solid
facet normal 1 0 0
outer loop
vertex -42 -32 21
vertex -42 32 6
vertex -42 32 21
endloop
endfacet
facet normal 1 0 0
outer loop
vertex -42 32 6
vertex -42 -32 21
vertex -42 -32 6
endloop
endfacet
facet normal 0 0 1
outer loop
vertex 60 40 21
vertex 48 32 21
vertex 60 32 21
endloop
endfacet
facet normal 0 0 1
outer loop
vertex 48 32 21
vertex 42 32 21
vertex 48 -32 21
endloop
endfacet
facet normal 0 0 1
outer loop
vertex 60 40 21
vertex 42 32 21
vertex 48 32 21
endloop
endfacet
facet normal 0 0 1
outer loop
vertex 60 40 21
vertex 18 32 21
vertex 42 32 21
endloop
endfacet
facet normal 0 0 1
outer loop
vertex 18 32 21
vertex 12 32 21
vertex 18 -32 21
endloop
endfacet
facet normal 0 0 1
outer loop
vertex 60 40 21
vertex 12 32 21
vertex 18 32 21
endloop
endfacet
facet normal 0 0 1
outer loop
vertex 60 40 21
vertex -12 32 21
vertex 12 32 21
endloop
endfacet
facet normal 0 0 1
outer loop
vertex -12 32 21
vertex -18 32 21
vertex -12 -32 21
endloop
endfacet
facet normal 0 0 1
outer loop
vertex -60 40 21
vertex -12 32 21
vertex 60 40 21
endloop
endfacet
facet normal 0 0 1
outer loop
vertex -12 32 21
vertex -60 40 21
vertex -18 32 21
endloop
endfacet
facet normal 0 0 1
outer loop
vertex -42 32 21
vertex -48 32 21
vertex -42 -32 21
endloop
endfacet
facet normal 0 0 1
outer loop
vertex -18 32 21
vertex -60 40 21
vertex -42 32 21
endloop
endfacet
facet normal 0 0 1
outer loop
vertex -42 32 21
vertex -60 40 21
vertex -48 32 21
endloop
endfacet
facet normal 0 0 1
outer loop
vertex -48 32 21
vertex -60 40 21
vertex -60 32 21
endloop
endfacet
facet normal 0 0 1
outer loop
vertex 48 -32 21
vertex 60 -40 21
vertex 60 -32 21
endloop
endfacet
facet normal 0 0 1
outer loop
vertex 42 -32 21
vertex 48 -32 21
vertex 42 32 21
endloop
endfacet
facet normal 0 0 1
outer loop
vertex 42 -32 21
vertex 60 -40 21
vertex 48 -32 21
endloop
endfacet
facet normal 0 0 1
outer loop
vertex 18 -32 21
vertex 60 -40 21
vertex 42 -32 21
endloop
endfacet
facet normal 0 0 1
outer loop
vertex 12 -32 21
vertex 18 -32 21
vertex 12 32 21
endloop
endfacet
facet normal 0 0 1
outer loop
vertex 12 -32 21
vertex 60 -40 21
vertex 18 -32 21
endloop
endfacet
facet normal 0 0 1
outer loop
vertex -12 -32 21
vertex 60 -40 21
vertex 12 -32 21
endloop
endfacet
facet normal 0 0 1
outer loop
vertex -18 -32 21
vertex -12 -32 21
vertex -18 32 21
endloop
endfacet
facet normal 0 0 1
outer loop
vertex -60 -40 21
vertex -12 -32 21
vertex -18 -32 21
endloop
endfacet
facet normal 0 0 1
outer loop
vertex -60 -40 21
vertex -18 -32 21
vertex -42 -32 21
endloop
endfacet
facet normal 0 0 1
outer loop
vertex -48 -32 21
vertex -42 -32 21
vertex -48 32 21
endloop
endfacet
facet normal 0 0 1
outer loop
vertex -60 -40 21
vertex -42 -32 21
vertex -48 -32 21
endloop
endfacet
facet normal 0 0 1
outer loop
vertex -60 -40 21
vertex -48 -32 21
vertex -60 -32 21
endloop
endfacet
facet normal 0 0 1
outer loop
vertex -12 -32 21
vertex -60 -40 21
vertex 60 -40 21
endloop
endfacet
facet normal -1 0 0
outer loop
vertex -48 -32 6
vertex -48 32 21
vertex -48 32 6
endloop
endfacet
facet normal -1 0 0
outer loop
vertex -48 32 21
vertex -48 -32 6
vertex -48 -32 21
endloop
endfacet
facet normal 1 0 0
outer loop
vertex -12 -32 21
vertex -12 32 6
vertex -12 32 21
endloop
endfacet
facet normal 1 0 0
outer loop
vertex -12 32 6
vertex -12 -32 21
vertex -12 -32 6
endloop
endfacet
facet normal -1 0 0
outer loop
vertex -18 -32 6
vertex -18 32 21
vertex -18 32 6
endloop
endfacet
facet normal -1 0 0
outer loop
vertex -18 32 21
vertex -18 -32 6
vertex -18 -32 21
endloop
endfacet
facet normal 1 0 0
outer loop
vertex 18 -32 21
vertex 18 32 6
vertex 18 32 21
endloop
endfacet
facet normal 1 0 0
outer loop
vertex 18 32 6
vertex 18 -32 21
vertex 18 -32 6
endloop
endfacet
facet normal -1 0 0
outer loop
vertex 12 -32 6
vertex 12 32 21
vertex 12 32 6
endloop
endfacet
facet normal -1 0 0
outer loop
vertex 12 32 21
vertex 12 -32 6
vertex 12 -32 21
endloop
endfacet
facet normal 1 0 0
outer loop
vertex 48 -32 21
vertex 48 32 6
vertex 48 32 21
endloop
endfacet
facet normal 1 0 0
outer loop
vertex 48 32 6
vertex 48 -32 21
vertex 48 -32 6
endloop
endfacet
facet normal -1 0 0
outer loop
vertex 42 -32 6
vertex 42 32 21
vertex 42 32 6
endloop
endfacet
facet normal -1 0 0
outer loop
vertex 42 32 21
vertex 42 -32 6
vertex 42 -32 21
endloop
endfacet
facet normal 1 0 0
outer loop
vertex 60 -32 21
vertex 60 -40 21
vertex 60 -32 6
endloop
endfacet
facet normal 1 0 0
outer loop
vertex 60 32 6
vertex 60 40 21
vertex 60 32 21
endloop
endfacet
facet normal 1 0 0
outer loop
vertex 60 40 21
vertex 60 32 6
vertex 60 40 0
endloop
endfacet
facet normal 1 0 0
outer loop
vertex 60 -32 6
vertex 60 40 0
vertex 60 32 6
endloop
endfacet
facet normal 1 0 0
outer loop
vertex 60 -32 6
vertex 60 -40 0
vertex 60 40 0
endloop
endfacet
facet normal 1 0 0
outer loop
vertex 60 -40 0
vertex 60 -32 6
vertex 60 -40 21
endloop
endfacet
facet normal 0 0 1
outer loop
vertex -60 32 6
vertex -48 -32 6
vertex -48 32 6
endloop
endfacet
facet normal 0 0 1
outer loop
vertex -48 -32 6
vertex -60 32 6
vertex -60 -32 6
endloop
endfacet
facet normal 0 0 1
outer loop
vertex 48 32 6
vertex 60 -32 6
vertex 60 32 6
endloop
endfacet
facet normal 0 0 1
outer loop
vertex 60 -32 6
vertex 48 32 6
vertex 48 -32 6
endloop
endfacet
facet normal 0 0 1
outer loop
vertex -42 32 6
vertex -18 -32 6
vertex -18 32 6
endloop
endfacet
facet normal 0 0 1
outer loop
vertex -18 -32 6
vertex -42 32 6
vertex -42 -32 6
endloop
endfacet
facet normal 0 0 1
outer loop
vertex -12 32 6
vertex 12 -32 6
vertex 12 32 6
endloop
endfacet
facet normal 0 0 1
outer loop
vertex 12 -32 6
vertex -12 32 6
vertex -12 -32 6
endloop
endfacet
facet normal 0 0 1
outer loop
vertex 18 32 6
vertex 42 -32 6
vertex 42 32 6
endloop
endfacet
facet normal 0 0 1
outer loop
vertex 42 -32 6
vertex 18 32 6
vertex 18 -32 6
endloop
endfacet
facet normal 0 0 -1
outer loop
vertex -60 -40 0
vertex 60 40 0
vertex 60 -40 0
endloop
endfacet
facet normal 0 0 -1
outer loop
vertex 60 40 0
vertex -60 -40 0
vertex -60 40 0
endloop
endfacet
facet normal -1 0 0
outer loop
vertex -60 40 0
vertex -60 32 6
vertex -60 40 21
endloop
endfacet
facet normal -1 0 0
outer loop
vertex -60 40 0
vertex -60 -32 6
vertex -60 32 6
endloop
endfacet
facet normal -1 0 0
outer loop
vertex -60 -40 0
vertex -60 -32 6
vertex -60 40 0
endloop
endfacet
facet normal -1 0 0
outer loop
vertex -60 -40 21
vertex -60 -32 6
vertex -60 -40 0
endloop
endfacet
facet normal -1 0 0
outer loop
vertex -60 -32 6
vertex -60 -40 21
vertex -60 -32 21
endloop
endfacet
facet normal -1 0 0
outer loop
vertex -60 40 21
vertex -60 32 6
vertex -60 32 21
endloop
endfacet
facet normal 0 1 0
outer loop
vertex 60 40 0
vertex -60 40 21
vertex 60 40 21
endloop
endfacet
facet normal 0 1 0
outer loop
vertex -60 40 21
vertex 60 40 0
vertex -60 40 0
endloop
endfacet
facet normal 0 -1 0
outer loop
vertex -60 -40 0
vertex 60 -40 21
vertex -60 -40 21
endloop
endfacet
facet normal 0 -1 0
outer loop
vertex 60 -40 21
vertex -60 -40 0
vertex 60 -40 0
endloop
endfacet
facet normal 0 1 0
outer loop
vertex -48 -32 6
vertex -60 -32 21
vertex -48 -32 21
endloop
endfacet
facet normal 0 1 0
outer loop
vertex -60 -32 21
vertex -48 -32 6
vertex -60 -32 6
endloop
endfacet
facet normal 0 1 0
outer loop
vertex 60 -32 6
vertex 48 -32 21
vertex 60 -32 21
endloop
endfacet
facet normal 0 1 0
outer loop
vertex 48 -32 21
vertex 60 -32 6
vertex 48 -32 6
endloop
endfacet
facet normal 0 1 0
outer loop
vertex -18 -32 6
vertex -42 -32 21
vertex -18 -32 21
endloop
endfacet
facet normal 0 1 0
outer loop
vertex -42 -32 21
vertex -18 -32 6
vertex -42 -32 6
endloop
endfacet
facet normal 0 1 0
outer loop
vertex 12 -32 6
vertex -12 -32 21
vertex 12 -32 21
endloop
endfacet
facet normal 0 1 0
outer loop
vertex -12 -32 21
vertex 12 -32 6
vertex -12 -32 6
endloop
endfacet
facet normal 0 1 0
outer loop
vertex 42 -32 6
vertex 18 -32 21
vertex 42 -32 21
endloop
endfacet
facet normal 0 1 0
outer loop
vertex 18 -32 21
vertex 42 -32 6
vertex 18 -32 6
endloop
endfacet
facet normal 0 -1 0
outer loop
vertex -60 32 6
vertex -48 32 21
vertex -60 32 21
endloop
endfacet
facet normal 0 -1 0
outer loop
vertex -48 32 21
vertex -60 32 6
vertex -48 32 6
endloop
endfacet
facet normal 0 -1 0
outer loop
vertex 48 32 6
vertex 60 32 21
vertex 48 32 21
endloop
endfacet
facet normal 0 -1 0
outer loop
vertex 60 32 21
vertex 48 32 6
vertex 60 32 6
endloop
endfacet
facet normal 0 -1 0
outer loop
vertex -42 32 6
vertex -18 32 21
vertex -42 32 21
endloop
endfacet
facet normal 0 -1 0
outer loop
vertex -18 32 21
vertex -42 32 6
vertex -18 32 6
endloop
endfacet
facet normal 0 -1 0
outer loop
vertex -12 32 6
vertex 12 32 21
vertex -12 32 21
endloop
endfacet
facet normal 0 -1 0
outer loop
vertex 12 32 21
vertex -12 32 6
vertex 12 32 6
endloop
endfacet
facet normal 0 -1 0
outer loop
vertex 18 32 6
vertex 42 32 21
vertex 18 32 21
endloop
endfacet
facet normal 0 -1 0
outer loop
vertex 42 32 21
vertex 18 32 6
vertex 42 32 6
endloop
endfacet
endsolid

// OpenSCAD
$fn = 32;

// ----------------------------------------------------------------------
// Rib frame 120 x 80 x 21
// 4 ribs at 30 mm pitch
// ----------------------------------------------------------------------

// --- parameters (mm) ---
frame = [120, 80, 6];  // base plate size (x, y, z)
rail_w = 8;            // side rail width
ribs = 4;              // number of ribs
rib_t = 6;             // rib thickness
rib_h = 15;            // rib height above the base plate
pitch = 30;            // pitch between rib centres

// --- derived feature positions (mm) ---
span = (ribs - 1) * pitch;          // = 90   distance between the outer ribs
origin_x = -span / 2;               // = -45   X of the first rib
rib_len = frame[1] - 2 * rail_w + 2;  // = 66   rib length, 1 mm into each rail
feature_centers = [
  [origin_x + 0 * pitch, 0],
  [origin_x + 1 * pitch, 0],
  [origin_x + 2 * pitch, 0],
  [origin_x + 3 * pitch, 0]
];   // rib centre line, drives the rib loop

// base plate, two side rails, then the ribs read straight off feature_centers
union() {
  translate([-frame[0] / 2, -frame[1] / 2, 0]) cube(frame);
  translate([-frame[0] / 2, -frame[1] / 2, 0]) cube([frame[0], rail_w, frame[2] + rib_h]);
  translate([-frame[0] / 2, frame[1] / 2 - rail_w, 0]) cube([frame[0], rail_w, frame[2] + rib_h]);
  for (centre = feature_centers)
    translate([centre[0] - rib_t / 2, centre[1] - rib_len / 2, frame[2] - 1])
      cube([rib_t, rib_len, rib_h + 1]);
}
